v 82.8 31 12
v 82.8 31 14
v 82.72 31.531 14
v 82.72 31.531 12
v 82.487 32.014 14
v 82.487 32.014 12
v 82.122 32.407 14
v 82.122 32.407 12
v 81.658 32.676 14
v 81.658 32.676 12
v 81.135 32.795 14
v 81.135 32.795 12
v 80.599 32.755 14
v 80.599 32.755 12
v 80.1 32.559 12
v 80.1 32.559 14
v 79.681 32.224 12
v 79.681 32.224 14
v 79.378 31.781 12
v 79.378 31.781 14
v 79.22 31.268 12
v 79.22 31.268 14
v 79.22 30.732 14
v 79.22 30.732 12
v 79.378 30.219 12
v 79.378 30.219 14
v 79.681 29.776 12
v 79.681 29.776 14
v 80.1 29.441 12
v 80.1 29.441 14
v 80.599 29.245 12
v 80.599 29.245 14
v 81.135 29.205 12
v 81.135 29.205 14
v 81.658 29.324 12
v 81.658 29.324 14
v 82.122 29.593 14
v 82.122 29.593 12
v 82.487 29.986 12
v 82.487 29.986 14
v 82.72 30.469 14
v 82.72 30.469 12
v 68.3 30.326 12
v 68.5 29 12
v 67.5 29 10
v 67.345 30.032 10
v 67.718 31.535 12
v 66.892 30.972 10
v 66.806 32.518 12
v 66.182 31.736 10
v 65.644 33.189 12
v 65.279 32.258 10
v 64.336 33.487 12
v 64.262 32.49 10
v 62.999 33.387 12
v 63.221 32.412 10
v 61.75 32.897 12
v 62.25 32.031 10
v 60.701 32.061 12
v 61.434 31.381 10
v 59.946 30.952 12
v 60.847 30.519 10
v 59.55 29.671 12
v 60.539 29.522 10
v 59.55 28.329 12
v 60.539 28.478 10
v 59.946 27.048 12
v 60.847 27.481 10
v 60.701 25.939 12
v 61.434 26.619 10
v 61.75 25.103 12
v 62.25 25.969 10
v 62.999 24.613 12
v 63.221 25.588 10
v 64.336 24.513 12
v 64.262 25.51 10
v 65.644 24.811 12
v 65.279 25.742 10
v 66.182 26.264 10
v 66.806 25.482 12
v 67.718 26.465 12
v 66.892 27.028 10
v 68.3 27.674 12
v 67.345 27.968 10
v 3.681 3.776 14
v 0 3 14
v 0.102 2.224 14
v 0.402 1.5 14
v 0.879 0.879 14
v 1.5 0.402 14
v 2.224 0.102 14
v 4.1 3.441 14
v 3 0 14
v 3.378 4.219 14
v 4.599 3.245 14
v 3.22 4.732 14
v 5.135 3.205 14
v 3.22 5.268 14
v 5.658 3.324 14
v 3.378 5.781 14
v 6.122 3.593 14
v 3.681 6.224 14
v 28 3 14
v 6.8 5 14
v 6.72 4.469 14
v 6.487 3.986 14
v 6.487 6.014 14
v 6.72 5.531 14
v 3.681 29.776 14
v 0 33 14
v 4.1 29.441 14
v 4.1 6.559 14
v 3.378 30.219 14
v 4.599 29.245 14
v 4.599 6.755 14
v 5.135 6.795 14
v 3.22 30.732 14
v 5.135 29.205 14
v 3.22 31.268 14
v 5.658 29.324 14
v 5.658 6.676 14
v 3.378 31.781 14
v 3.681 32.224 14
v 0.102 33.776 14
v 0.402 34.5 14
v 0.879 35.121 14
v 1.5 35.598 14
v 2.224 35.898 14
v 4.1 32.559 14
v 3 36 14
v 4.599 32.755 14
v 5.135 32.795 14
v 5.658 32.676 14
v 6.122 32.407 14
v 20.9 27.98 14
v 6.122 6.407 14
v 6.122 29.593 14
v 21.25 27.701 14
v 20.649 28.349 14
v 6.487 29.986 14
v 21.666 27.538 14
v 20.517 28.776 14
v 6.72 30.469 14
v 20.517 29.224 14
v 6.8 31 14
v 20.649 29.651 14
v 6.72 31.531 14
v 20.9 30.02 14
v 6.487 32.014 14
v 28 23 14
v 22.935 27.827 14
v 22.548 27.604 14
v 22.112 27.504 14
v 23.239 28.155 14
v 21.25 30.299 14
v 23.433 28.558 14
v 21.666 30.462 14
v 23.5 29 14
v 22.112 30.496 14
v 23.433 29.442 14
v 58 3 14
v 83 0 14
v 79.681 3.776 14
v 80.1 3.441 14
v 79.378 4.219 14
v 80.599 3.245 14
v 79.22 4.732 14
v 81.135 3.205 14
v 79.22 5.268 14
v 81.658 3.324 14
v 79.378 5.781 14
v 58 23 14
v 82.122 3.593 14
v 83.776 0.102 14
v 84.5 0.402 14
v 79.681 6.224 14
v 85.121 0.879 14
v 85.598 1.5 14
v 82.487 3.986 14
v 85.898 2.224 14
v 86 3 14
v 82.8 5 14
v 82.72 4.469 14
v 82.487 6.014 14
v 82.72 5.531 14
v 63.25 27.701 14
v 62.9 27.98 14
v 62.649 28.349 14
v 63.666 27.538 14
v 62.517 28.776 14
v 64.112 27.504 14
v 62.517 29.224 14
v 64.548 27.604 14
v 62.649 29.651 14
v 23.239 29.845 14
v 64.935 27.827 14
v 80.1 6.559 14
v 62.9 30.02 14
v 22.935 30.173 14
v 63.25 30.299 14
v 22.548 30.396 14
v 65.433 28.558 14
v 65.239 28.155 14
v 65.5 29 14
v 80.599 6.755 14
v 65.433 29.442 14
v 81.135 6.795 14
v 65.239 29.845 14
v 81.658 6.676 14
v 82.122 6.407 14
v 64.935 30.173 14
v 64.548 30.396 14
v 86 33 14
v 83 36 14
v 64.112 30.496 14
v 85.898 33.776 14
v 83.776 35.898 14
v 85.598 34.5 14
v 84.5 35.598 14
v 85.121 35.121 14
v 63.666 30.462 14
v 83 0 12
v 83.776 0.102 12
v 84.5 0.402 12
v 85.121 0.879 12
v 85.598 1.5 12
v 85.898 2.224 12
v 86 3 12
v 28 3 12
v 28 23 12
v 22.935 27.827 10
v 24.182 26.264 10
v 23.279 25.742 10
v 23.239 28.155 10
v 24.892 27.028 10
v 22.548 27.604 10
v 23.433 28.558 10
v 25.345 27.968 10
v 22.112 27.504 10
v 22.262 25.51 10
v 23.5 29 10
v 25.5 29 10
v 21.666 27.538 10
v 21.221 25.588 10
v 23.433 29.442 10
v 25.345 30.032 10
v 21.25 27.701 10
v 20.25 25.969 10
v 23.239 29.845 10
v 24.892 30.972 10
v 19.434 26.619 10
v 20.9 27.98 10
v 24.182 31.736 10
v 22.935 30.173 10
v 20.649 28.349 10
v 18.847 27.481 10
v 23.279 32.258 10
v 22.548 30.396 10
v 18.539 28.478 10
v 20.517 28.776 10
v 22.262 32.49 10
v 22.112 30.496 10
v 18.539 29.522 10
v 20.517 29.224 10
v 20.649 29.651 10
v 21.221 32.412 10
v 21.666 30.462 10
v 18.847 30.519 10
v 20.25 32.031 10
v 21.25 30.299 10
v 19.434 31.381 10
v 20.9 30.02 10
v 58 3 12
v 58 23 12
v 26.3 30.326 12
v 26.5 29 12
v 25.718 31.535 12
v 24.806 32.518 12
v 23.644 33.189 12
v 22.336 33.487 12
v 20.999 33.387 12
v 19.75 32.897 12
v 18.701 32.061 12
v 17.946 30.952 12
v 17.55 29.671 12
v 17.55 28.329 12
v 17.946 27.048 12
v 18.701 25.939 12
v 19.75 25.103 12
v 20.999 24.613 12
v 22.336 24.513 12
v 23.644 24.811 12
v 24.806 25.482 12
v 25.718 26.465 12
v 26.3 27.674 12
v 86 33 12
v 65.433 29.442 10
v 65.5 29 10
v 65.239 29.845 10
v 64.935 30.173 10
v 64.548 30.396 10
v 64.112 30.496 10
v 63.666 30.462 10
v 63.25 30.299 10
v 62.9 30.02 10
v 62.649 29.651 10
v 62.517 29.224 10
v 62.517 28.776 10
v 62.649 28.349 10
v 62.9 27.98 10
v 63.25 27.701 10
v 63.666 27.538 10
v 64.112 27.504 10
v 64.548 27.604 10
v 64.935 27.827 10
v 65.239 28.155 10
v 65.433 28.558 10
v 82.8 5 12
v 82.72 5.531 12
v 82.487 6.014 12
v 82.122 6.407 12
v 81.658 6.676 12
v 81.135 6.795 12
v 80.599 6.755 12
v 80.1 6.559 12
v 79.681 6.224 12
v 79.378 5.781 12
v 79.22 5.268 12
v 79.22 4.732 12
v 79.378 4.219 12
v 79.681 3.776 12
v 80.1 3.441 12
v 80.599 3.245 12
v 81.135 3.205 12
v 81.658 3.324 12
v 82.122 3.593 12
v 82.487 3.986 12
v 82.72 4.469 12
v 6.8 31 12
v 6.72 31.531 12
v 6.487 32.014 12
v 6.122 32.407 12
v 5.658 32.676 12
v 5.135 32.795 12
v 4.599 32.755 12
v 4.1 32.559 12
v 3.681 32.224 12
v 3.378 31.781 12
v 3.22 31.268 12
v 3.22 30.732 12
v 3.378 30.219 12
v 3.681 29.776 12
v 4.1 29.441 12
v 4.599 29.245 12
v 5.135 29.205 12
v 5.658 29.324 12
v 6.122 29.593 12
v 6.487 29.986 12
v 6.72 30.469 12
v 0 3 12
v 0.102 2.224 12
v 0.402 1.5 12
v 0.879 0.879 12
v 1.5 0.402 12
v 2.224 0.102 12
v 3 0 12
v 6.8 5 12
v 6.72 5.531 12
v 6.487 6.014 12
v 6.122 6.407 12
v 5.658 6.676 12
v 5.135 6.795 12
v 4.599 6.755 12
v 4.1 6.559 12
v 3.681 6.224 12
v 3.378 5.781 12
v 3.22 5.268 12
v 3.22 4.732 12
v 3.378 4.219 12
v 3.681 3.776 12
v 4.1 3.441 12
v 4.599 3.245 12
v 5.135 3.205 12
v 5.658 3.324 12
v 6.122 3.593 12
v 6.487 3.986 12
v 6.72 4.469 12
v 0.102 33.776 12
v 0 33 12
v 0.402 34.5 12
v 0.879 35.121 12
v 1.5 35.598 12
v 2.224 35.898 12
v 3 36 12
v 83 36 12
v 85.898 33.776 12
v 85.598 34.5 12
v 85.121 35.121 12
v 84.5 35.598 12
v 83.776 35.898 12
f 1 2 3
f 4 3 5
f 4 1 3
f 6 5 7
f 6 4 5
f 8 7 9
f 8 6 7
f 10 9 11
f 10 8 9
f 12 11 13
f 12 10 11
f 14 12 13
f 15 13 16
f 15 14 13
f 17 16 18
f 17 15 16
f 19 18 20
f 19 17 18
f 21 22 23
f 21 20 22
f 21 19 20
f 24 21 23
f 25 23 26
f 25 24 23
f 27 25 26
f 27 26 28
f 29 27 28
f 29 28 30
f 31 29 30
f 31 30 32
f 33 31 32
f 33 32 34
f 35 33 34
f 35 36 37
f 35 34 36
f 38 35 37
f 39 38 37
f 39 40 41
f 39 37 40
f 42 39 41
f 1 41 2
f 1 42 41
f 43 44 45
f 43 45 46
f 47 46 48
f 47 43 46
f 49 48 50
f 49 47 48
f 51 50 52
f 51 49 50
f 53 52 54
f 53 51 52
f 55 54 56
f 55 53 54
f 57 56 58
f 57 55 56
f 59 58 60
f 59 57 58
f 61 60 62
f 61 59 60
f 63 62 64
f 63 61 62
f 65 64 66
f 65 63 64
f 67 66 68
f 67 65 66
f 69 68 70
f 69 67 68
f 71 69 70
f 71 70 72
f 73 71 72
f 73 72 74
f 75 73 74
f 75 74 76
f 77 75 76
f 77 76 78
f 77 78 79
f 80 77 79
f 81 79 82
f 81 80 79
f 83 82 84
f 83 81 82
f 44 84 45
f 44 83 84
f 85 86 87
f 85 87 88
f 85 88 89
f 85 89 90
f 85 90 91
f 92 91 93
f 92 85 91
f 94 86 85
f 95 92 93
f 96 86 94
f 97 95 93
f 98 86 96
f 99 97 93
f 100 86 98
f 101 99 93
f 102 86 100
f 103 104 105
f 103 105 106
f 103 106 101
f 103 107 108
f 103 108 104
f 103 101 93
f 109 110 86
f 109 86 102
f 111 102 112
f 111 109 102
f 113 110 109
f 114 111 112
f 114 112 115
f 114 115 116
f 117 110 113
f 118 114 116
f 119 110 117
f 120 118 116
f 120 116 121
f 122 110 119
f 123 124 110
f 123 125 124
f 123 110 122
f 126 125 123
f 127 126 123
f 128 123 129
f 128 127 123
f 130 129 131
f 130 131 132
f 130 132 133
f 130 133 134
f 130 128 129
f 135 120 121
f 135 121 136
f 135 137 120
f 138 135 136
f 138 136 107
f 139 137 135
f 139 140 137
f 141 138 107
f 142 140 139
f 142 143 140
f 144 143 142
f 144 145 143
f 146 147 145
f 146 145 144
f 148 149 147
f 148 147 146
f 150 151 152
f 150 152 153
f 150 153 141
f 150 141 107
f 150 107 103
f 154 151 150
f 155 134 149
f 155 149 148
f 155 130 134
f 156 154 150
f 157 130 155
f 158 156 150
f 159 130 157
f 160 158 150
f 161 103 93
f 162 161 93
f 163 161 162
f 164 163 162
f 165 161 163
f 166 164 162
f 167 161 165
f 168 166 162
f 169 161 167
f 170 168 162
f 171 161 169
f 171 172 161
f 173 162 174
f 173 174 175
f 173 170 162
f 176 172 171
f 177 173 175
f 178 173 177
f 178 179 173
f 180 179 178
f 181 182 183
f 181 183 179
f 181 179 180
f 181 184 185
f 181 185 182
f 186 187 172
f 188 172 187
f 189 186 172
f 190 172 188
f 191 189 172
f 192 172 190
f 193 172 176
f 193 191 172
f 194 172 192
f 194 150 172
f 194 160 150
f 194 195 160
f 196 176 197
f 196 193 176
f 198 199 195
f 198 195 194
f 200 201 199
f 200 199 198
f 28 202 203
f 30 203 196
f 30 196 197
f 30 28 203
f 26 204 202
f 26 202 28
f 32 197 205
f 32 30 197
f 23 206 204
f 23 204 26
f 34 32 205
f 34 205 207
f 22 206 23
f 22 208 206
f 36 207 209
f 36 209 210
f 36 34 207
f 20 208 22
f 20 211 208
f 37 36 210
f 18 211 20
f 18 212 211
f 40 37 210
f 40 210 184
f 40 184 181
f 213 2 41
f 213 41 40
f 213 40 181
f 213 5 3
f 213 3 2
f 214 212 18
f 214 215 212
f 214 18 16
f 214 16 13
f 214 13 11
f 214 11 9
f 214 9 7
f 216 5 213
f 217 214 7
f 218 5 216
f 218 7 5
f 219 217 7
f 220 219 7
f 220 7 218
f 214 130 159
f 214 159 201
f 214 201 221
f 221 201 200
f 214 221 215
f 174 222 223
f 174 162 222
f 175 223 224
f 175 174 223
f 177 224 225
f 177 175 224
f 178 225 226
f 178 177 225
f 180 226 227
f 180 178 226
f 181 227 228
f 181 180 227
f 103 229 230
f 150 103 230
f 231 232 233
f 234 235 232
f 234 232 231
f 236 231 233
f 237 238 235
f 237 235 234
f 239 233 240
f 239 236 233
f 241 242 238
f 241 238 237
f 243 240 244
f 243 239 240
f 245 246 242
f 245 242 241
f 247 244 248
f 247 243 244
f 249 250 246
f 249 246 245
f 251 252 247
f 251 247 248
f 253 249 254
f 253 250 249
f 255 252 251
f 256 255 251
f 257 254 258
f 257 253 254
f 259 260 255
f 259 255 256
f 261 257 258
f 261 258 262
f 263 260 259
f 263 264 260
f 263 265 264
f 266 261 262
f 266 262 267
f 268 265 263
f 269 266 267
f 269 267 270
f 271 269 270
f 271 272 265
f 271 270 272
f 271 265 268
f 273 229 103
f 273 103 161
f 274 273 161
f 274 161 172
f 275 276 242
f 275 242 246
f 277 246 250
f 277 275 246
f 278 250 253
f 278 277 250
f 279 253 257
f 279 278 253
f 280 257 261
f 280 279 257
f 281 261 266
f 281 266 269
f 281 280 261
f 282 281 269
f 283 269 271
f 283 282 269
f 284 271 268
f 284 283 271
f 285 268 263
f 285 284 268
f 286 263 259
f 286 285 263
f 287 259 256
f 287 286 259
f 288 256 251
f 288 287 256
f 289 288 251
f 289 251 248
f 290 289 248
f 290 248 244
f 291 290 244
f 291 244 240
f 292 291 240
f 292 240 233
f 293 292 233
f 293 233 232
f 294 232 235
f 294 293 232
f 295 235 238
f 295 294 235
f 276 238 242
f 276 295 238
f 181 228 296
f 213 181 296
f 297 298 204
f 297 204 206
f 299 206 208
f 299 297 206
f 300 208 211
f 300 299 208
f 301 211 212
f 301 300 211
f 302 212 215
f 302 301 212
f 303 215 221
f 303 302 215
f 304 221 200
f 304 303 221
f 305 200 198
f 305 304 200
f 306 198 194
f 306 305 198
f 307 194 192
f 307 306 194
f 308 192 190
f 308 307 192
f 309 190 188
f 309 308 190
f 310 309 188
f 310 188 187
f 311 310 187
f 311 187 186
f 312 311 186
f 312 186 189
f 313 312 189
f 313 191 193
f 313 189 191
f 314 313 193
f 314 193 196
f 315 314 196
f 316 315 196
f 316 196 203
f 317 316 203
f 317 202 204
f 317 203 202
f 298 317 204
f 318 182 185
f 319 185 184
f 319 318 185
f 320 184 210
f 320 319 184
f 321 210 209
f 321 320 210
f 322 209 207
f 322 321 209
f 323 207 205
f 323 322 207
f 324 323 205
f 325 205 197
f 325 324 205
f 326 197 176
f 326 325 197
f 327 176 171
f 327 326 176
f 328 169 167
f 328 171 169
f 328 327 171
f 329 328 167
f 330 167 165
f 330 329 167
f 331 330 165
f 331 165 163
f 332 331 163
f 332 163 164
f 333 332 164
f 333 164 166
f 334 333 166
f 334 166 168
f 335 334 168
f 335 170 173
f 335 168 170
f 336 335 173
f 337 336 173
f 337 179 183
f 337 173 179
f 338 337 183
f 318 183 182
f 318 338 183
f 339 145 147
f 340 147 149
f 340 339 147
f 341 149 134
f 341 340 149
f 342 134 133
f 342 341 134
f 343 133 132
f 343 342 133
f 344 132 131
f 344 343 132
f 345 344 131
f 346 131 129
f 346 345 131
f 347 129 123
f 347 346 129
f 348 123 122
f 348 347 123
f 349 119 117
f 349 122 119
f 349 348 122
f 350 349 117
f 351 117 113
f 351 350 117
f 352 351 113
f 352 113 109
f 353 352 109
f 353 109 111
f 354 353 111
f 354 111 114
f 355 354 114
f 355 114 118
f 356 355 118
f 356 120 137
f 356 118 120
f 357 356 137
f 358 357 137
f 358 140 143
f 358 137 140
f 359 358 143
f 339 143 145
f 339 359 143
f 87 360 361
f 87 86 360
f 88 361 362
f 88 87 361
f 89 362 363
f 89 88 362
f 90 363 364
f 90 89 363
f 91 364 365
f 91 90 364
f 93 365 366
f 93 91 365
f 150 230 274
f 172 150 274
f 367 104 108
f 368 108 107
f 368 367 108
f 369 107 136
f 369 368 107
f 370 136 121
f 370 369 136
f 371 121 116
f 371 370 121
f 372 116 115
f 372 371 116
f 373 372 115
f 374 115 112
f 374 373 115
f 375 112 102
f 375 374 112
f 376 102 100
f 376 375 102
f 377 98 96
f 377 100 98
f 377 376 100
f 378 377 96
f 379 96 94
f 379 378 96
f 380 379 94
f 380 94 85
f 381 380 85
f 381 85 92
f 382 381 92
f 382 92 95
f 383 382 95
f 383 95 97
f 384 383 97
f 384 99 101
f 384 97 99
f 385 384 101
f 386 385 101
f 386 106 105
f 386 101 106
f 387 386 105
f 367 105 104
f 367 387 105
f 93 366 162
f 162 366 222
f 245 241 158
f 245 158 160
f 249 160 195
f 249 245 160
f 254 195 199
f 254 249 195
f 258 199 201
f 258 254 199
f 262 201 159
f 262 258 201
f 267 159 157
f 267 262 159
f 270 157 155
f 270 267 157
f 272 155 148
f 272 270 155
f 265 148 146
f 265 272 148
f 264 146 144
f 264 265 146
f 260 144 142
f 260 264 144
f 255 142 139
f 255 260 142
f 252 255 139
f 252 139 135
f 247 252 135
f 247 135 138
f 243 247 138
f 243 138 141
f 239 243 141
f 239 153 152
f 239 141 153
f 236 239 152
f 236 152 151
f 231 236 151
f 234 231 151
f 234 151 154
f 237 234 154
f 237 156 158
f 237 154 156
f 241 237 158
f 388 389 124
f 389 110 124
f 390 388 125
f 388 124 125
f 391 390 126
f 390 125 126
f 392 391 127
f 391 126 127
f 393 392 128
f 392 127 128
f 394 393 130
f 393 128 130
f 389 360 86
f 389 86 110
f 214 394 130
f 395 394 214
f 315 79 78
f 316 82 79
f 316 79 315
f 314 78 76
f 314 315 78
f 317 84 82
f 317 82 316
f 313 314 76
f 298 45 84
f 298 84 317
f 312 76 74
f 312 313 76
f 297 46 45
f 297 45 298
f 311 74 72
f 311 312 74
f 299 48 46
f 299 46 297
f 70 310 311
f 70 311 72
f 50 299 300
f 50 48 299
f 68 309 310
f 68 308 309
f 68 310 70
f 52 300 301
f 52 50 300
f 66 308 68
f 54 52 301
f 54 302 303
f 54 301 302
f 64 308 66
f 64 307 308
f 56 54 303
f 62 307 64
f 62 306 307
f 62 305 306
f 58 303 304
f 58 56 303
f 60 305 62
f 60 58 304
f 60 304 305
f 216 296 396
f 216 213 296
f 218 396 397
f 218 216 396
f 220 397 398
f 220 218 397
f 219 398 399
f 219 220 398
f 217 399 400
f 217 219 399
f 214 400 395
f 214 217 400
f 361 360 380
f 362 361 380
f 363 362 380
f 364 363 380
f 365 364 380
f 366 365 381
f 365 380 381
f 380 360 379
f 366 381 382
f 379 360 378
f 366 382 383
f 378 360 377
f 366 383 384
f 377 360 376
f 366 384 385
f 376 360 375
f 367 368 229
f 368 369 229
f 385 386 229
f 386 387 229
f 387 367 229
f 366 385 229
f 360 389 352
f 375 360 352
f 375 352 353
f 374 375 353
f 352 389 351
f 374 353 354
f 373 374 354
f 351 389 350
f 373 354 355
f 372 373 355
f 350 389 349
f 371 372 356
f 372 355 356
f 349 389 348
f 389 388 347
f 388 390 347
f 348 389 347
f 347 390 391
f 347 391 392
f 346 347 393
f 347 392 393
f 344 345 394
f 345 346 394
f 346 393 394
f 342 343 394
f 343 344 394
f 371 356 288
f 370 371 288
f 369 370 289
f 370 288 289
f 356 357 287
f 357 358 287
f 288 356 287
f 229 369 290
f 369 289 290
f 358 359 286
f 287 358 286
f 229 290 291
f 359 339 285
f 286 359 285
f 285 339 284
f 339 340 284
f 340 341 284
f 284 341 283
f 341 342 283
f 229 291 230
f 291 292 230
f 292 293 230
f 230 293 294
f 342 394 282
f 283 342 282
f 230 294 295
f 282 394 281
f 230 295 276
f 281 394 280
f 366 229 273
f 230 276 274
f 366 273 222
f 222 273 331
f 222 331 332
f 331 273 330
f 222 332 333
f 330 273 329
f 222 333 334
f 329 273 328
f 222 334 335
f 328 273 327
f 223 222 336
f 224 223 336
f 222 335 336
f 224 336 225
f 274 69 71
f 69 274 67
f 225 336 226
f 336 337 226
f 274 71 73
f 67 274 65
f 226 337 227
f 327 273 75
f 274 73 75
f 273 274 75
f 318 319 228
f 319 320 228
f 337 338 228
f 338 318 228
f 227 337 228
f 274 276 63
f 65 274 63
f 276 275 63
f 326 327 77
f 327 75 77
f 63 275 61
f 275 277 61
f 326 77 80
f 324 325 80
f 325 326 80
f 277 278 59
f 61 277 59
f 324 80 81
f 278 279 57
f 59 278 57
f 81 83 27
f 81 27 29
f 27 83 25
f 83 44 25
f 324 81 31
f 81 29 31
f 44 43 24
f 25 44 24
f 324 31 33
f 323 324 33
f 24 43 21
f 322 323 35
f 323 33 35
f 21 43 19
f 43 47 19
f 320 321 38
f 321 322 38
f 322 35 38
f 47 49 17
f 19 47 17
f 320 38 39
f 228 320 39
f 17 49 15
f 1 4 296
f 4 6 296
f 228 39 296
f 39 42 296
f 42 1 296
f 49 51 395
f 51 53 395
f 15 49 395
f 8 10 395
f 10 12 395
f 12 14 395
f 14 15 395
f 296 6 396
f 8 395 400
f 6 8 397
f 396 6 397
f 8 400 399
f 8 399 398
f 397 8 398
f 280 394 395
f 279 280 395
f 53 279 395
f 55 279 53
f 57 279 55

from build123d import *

# Parameters (mm, degrees)
CYLINDER052_R       = 1.5
CYLINDER052_DEPTH   = 20
ARRAY001023_X_COUNT = 2
ARRAY001023_X_PITCH = 42
CYLINDER056_R       = 1.8
CYLINDER056_DEPTH   = 12
ARRAY001028_X_COUNT = 2
ARRAY001028_X_PITCH = 76
ARRAY001028_Y_COUNT = 2
ARRAY001028_Y_PITCH = 26
BOX024_W            = 30
BOX024_H            = 20
BOX024_DEPTH        = 10
BOX023_W            = 86
BOX023_H            = 36
BOX023_DEPTH        = 2
FILLET012_R         = 3
ARRAY001027_X_COUNT = 2
ARRAY001027_X_PITCH = 42


with BuildPart() as microslider_bolt_hole_array001:
    # Cylinder052 → Cylinder052 (new body)
    with BuildSketch(Plane(origin=(22, 29, -5), x_dir=(1, 0, 0), z_dir=(0, 0, 1))):
        Circle(CYLINDER052_R)
    extrude(amount=CYLINDER052_DEPTH)

    # Array001023 X: microslider bolt hole array001 ×2


with BuildPart() as microslider_bolt_hole_array001_1:
    add(microslider_bolt_hole_array001.part)
    with Locations(*[(i * ARRAY001023_X_PITCH, 0, 0) for i in range(1, ARRAY001023_X_COUNT)]):
        add(microslider_bolt_hole_array001.part)


with BuildPart() as msub_bolt_hole_array001:
    # Cylinder056 → Cylinder056 (new body)
    with BuildSketch(Plane(origin=(5, 5, 0), x_dir=(1, 0, 0), z_dir=(0, 0, 1))):
        Circle(CYLINDER056_R)
    extrude(amount=CYLINDER056_DEPTH)

    # Array001028 X: msub bolt hole array001 ×2


with BuildPart() as msub_bolt_hole_array001_1:
    add(msub_bolt_hole_array001.part)
    with Locations(*[(i * ARRAY001028_X_PITCH, 0, 0) for i in range(1, ARRAY001028_X_COUNT)]):
        add(msub_bolt_hole_array001.part)

    # Array001028 Y: msub bolt hole array001 ×2


with BuildPart() as msub_bolt_hole_array001_2:
    add(msub_bolt_hole_array001_1.part)
    with Locations(*[(0, i * ARRAY001028_Y_PITCH, 0) for i in range(1, ARRAY001028_Y_COUNT)]):
        add(msub_bolt_hole_array001_1.part)


with BuildPart() as msub_top_hole_fusion:
    # Box024 → Box024 (new body)
    with BuildSketch(Plane(origin=(28, 3, -5), x_dir=(1, 0, 0), z_dir=(0, 0, 1))):
        with Locations((15, 10)):
            Rectangle(BOX024_W, BOX024_H)
    extrude(amount=BOX024_DEPTH)

    # Fusion034: union microslider bolt hole array001, msub bolt hole array001
    add(microslider_bolt_hole_array001_1.part)
    add(msub_bolt_hole_array001_2.part)


with BuildPart() as msub_top_fillet:
    # Box023 → Box023 (new body)
    with BuildSketch(Plane.XY):
        with Locations((43, 18)):
            Rectangle(BOX023_W, BOX023_H)
    extrude(amount=BOX023_DEPTH)

    # Fillet012
    fillet012_edges = [msub_top_fillet.edges().sort_by_distance(p)[0] for p in [
        (0, 0, 1),
        (0, 36, 1),
        (86, 0, 1),
        (86, 36, 1),
    ]]
    fillet(fillet012_edges, radius=FILLET012_R)


with BuildPart() as msub_top_cut:
    # Cone003 → Cone003 (revolve)
    with BuildSketch(Plane(origin=(22, 29, -2), x_dir=(1, 0, 0), z_dir=(0, -1, 0))):
        Polygon((0, 0), (3.5, 0), (5, 3), (0, 3), align=None)
    revolve(axis=Axis((22, 29, -2), (0, 0, 1)))

    # Array001027 X: msub top cut ×2


with BuildPart() as msub_top_cut_1:
    add(msub_top_cut.part)
    with Locations(*[(i * ARRAY001027_X_PITCH, 0, 0) for i in range(1, ARRAY001027_X_COUNT)]):
        add(msub_top_cut.part)

    # Fusion038: union msub top fillet
    add(msub_top_fillet.part)

    # Cut021: cut msub top hole fusion
    add(msub_top_hole_fusion.part, mode=Mode.SUBTRACT)


with BuildPart() as msub_top_cut_2:
    # Cut021 placement: moved
    add(msub_top_cut_1.part.moved(Location((0, 0, 12))))


solid = msub_top_cut_2.part
